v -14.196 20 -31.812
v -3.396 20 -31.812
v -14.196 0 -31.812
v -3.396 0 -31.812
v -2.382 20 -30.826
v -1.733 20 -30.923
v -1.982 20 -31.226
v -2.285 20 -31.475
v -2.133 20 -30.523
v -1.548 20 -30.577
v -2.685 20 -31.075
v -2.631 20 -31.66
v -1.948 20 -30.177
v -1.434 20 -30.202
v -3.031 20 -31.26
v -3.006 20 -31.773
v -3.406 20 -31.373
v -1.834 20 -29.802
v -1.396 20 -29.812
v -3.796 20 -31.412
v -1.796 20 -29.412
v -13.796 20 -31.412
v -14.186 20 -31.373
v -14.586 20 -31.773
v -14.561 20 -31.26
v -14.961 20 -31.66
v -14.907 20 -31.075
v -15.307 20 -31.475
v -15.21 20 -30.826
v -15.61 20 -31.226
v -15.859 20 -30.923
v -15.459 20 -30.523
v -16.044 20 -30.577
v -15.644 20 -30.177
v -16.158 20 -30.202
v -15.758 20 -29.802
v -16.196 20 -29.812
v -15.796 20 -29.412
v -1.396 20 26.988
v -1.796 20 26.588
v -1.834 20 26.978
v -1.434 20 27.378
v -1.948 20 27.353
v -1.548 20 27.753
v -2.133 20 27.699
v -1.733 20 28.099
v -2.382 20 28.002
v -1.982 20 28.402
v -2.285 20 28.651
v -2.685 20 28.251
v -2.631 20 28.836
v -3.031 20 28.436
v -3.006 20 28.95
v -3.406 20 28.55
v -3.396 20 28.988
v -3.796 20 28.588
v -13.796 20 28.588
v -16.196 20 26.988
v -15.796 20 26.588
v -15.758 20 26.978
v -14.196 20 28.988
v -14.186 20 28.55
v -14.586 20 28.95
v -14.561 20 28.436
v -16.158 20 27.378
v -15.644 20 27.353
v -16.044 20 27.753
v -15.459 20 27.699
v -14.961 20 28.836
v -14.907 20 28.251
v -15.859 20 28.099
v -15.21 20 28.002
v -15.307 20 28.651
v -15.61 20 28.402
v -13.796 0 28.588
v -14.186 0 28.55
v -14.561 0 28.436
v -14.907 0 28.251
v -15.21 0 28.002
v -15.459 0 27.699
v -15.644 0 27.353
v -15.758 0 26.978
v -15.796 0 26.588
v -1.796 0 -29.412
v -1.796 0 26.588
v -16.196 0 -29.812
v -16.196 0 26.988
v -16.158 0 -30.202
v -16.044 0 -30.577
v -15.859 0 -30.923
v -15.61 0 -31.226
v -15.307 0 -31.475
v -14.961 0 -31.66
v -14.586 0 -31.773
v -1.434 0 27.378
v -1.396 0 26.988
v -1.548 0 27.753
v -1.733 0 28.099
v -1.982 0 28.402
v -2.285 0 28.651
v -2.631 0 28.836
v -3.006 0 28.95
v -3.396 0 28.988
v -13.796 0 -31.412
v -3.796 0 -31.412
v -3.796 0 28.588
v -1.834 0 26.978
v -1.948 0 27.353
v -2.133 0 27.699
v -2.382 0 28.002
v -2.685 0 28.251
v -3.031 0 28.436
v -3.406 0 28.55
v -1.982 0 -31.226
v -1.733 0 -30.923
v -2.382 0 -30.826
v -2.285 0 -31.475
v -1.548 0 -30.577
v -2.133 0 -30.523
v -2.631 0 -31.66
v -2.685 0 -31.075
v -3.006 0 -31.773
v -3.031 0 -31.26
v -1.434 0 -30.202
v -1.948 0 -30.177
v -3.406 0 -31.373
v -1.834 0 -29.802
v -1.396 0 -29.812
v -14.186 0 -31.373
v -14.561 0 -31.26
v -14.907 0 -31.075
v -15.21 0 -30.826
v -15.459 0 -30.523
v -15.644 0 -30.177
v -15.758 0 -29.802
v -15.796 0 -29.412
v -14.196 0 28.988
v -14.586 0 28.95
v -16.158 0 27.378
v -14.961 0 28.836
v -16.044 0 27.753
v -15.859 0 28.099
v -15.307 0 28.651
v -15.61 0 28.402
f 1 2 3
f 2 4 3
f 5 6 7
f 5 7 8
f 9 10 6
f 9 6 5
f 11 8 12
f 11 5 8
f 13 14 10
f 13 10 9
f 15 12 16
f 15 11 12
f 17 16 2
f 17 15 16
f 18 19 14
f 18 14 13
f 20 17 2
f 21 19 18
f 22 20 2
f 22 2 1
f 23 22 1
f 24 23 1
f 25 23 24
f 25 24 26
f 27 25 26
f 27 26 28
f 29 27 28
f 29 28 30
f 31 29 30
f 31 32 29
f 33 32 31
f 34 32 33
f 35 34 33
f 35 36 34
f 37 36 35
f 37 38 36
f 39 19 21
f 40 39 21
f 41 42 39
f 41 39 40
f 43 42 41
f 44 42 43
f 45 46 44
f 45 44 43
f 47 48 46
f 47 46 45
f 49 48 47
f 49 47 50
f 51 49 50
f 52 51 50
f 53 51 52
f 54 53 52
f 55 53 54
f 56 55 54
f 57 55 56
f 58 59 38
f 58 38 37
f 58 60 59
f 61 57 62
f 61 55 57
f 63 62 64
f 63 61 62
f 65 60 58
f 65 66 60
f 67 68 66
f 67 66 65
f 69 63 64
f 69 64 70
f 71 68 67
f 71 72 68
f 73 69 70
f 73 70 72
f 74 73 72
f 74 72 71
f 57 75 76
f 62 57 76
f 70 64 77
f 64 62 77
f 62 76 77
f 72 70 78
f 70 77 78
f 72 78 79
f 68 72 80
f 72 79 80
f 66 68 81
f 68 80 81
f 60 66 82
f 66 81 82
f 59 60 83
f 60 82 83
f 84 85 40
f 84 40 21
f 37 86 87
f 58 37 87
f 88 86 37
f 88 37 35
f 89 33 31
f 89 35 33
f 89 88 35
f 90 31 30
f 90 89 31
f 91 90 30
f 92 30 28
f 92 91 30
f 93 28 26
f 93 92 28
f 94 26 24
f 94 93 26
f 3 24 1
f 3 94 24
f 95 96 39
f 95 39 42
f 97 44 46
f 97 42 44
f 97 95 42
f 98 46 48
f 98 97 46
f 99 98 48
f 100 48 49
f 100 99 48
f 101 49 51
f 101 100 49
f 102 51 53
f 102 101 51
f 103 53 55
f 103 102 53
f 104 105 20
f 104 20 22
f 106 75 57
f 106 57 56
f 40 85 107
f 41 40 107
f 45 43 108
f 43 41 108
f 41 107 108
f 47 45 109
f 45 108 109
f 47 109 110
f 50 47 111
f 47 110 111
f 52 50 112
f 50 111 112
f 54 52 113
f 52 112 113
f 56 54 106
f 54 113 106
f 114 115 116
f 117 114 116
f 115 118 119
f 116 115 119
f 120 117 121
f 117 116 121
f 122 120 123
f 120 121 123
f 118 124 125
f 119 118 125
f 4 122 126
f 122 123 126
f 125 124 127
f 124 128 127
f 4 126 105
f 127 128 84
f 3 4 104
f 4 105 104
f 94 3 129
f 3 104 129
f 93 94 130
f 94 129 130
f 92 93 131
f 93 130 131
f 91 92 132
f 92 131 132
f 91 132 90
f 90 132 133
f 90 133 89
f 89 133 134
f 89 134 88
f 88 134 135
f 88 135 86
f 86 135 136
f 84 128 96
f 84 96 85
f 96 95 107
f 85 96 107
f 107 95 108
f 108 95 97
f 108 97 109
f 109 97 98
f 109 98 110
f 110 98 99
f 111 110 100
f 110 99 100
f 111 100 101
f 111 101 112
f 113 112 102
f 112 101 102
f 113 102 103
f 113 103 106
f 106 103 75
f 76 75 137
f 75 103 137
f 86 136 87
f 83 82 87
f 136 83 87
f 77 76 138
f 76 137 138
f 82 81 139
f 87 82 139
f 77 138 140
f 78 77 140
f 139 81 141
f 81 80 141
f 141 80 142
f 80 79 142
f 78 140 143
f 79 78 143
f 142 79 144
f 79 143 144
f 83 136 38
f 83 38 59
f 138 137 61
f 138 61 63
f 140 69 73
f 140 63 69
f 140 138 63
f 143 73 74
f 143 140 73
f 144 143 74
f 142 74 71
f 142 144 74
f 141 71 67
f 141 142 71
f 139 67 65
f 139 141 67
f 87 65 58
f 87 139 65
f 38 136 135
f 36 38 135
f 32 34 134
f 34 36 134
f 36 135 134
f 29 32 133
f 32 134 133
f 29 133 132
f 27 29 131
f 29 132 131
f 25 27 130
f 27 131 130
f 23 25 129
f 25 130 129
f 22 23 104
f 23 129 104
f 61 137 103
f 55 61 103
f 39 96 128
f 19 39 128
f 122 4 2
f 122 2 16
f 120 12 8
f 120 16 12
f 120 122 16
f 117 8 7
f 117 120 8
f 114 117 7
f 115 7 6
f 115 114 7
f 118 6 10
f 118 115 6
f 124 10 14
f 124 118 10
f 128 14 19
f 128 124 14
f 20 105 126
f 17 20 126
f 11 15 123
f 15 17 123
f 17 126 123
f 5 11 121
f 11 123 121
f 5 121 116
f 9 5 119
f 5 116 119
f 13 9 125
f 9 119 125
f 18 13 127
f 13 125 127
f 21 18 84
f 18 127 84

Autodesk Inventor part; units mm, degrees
ref_plane "YZ Plane" through (0, 0, 0) normal (1, 0, 0) x (0, 1, 0)
ref_plane "XZ Plane" through (0, 0, 0) normal (0, 1, 0) x (-1, 0, 0)
ref_plane "XY Plane" through (0, 0, 0) normal (0, 0, 1) x (1, 0, 0)
sketch "Sketch1" plane through (0, 0, 0) normal (0, 1, 0) x (-1, 0, 0)
  line L0 (13.796, 28.5881) -> (3.796, 28.5881)
  line L1 (1.796, 26.5881) -> (1.796, -29.4119)
  line L2 (3.796, -31.4119) -> (13.796, -31.4119)
  line L3 (15.796, -29.4119) -> (15.796, 26.5881)
  arc A0 (15.796, 26.5881) -> (13.796, 28.5881) centre (13.796, 26.5881) ccw
  arc A1 (13.796, -31.4119) -> (15.796, -29.4119) centre (13.796, -29.4119) ccw
  arc A2 (1.796, -29.4119) -> (3.796, -31.4119) centre (3.796, -29.4119) ccw
  arc A3 (3.796, 28.5881) -> (1.796, 26.5881) centre (3.796, 26.5881) ccw
  line L4 (14.196, 28.9881) -> (3.396, 28.9881)
  line L5 (1.396, 26.9881) -> (1.396, -29.8119)
  line L6 (3.396, -31.8119) -> (14.196, -31.8119)
  line L7 (16.196, -29.8119) -> (16.196, 26.9881)
  arc A4 (16.196, 26.9881) -> (14.196, 28.9881) centre (14.196, 26.9881) ccw
  arc A5 (14.196, -31.8119) -> (16.196, -29.8119) centre (14.196, -29.8119) ccw
  arc A6 (1.396, -29.8119) -> (3.396, -31.8119) centre (3.396, -29.8119) ccw
  arc A7 (3.396, 28.9881) -> (1.396, 26.9881) centre (3.396, 26.9881) ccw
  point P0 (0, 0)
  point P1 (15.796, 28.5881)
  point P2 (1.796, -31.4119)
  point P3 (15.796, -31.4119)
  dimension "d0" = 60
  dimension "d1" = 14
  dimension "d2" = 2
  dimension "d3" = 0.4
  dimension "d4" = 0.4
  dimension "d5" = 0.4
  dimension "d6" = 0.4
  dimension "d7" = 2
extrude "Extrusion1" add sketch "Sketch1" along normal blind 20
properties part number "cinta"
